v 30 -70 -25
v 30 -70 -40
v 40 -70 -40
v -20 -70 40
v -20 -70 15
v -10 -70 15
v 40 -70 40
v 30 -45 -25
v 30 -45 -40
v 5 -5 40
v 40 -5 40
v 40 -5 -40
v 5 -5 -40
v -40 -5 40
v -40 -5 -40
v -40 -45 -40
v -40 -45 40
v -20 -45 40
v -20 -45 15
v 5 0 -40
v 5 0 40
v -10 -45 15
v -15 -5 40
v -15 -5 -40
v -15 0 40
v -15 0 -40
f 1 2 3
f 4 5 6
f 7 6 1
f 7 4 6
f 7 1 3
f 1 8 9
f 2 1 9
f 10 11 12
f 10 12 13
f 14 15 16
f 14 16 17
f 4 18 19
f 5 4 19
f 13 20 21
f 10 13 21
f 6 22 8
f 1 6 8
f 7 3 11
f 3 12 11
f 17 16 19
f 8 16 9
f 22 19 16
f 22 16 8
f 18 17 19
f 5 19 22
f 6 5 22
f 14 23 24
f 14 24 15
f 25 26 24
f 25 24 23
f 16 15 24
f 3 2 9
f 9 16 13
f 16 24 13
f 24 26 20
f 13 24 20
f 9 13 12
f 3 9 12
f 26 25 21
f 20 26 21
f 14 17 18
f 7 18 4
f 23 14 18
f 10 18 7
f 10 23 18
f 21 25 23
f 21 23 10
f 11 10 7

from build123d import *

# Parameters (mm, degrees)
F0_W     = 80
F0_H     = 80
F1_DEPTH = 45
F3_DEPTH = 25
F4_DEPTH = 25
F5_W     = 35
F5_H     = 80
F5_W_2   = 25
F6_DEPTH = 5


with BuildPart() as f1:
    # F0 (on Front) → F1 (new body)
    with BuildSketch(Plane.XZ):
        Rectangle(F0_W, F0_H)
    extrude(amount=F1_DEPTH)

    # F2 (on face) → F3 (join)
    with BuildSketch(Plane.XZ.offset(45)):
        Polygon((30, -25), (30, -40), (40, -40), (40, 15), (-10, 15), align=None)
    extrude(amount=F3_DEPTH)

    # F2 (on face) → F4 (join)
    with BuildSketch(Plane.XZ.offset(45)):
        Polygon((-20, 15), (-10, 15), (40, 15), (40, 40), (-20, 40), align=None)
    extrude(amount=F4_DEPTH)

    # F5 (on face) → F6 (cut)
    with BuildSketch(Plane(origin=(0, 0, 0), x_dir=(-1, 0, 0), z_dir=(0, 1, 0))):
        with Locations((-22.5, 0)):
            Rectangle(F5_W, F5_H)
        with Locations((27.5, 0)):
            Rectangle(F5_W_2, F5_H)
    extrude(amount=-F6_DEPTH, mode=Mode.SUBTRACT)


solid = f1.part
